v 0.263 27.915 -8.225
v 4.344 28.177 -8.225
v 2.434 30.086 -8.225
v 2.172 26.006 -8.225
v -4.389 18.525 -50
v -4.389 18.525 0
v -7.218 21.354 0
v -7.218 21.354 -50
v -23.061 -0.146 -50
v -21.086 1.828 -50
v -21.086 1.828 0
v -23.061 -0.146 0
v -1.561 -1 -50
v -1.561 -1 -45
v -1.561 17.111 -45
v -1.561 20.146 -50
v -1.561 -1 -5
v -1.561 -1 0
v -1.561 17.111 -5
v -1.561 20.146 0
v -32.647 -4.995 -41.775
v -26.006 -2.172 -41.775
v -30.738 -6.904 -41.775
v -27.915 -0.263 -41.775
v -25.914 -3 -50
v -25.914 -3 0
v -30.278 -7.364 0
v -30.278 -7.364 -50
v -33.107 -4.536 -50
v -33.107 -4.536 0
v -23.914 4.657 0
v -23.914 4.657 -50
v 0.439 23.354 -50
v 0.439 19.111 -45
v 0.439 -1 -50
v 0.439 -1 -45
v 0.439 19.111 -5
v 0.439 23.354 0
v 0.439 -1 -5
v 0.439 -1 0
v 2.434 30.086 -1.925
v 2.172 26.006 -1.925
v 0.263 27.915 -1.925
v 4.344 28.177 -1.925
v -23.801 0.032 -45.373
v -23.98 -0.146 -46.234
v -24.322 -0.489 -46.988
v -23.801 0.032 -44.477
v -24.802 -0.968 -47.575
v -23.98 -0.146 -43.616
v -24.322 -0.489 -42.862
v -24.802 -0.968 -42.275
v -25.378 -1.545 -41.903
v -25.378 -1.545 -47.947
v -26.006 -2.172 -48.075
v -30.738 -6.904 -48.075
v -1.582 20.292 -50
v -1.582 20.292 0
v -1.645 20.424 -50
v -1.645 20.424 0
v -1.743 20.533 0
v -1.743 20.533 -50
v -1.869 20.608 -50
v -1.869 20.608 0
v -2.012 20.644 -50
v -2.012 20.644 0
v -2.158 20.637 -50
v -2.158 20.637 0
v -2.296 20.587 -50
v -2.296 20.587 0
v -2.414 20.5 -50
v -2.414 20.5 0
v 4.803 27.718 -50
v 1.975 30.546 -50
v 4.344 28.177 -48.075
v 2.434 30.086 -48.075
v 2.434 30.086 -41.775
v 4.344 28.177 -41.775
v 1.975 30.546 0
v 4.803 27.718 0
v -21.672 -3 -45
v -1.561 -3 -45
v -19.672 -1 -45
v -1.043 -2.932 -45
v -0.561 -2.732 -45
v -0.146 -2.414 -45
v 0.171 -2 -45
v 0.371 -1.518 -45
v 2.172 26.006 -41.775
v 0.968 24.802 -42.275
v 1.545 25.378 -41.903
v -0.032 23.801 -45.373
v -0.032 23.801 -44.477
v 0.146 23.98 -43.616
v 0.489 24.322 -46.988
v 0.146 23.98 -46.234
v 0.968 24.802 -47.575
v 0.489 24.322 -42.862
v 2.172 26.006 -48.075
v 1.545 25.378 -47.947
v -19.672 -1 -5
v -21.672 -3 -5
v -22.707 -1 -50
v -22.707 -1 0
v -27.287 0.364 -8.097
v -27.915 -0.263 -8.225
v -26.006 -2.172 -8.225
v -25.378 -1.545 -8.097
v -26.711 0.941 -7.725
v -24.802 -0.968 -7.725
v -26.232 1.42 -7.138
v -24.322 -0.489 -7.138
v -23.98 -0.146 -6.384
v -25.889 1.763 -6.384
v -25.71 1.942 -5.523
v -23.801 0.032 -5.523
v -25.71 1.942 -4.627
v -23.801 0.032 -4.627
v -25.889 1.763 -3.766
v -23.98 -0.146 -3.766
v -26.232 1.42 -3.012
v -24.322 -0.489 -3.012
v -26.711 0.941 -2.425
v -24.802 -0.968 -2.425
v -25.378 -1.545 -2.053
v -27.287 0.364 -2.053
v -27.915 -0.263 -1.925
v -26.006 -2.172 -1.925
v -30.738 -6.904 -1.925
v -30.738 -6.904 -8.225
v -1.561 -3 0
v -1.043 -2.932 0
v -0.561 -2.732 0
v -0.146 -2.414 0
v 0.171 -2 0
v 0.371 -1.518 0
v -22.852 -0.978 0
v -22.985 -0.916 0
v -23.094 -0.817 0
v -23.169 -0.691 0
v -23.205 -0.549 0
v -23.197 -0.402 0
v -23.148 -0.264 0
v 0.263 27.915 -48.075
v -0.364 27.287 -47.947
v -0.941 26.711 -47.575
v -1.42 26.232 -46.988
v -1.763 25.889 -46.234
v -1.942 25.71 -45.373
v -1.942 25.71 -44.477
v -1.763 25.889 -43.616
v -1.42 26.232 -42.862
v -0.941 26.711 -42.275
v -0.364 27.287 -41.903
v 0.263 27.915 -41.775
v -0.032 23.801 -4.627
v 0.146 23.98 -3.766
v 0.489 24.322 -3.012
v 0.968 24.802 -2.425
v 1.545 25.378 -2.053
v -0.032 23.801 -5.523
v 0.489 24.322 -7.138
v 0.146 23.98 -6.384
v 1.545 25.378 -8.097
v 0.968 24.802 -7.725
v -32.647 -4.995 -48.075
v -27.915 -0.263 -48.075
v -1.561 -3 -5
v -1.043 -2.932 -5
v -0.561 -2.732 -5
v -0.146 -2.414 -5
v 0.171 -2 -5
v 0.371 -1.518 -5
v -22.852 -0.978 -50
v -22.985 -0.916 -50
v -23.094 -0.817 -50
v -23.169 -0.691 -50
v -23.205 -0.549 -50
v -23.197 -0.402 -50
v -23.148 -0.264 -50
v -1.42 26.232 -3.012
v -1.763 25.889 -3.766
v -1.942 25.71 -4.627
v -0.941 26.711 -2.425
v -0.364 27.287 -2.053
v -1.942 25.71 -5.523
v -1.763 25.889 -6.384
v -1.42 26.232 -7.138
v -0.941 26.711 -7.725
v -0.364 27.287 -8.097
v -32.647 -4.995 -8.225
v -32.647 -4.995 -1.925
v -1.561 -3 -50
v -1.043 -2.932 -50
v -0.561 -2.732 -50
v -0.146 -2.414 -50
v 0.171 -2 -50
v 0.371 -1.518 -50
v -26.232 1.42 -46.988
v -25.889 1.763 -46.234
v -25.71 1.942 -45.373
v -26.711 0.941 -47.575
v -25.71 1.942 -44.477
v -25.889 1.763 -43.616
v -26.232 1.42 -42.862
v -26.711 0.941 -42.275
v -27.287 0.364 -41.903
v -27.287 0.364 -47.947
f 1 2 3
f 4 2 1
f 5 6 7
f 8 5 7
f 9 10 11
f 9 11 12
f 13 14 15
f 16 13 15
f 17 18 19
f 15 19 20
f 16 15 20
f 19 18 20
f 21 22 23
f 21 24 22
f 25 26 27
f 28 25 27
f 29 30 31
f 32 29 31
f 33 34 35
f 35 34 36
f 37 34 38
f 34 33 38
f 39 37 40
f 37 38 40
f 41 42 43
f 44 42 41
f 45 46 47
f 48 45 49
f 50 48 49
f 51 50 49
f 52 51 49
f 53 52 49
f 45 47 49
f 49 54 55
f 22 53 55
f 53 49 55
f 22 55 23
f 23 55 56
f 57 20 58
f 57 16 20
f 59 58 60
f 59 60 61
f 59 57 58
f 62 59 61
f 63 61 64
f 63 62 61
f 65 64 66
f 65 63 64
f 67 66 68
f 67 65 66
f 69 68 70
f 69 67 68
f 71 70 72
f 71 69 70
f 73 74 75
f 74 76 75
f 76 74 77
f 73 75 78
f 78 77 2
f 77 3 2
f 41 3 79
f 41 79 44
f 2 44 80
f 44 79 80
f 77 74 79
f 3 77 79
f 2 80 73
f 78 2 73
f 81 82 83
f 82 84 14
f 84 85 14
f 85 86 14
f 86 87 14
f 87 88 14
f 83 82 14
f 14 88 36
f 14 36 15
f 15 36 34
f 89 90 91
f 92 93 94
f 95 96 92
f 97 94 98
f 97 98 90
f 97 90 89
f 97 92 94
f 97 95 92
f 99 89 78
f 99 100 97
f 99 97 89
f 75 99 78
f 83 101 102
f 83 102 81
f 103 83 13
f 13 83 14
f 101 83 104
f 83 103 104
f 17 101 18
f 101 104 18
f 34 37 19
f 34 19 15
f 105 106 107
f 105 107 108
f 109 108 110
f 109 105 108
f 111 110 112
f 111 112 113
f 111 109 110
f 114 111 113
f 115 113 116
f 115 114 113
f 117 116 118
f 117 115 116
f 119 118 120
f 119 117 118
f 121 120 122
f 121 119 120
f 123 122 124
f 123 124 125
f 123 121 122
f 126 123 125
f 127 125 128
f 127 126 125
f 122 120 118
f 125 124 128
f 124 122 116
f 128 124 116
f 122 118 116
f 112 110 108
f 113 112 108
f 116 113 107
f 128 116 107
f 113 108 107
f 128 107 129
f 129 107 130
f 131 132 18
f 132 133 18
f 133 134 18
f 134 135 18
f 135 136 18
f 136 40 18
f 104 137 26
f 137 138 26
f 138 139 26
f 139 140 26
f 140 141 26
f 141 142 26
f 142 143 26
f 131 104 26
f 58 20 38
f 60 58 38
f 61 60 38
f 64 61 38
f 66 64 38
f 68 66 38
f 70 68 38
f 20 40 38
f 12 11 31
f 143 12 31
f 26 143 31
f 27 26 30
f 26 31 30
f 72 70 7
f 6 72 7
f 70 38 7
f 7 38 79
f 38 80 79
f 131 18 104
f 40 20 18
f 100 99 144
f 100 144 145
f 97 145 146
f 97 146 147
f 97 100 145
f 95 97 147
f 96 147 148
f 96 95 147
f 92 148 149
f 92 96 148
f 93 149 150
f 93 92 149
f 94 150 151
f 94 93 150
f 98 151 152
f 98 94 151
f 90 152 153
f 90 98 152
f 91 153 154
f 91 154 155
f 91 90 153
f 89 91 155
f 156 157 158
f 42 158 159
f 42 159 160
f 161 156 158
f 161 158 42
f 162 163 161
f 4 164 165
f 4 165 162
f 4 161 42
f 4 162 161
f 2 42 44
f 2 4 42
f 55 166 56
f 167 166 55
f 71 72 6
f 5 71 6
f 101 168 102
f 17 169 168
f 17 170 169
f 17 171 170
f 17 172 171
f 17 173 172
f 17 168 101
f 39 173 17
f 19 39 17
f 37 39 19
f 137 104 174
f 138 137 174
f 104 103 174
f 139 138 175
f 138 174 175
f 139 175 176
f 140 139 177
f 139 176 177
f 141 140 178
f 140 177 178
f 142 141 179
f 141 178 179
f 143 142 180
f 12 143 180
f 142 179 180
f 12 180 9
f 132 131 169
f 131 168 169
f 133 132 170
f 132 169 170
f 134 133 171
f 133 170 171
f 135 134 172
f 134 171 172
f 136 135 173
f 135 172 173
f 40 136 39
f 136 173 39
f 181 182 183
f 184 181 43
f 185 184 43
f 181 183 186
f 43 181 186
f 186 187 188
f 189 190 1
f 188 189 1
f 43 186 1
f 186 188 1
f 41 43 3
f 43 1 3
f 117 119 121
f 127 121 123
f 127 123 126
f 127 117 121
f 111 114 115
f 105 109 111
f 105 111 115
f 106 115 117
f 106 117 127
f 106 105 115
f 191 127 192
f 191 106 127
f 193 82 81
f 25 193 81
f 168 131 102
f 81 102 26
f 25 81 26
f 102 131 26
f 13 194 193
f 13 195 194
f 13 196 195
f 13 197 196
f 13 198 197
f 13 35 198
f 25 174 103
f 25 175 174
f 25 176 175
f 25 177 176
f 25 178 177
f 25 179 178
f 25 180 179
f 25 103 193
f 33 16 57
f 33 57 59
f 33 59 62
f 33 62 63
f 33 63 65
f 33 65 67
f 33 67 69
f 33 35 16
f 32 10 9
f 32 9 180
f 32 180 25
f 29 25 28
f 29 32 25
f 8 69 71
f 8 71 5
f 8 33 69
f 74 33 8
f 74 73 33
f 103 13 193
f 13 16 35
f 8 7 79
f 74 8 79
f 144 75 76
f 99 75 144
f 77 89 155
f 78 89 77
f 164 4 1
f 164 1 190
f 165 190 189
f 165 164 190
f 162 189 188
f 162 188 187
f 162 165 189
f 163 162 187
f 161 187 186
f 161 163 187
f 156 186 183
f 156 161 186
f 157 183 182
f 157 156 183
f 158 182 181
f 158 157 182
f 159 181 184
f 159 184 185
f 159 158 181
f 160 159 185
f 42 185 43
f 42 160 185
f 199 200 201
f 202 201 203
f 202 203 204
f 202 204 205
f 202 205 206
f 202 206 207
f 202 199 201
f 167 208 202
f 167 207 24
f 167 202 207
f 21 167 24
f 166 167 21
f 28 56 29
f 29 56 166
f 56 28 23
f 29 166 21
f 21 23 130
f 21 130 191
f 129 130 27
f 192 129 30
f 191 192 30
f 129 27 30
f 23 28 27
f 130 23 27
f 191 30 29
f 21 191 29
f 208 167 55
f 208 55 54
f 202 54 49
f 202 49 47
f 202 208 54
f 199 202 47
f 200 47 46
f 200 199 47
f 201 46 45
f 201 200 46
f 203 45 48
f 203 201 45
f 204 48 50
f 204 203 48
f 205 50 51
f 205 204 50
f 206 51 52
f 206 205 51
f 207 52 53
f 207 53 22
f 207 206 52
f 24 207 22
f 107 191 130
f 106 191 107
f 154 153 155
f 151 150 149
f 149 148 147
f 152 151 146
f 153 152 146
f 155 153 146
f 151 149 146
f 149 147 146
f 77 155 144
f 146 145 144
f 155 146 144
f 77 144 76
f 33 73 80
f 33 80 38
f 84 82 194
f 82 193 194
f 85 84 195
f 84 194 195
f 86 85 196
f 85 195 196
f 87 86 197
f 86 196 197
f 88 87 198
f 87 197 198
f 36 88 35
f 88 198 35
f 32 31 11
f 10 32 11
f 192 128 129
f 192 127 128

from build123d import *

# Parameters (mm, degrees)
BOSS_EXTRUDE1_DEPTH     = 50
CUT_EXTRUDE1_DEPTH      = 1.35
CUT_EXTRUDE1_DEPTH_BACK = 1.35
SKETCH3_W               = 40
SKETCH3_H               = 20
CUT_EXTRUDE2_DEPTH      = 52.612698372
FILLET1_R               = 0.5
FILLET2_R               = 2


with BuildPart() as part:
    # Sketch1 → Boss-Extrude1 (new body)
    with BuildSketch(Plane.XY):
        Polygon((-23.914213562, -1), (-1.560660172, -1), (-1.560660172, 21.353553391), (-4.389087297, 18.525126266), (-7.217514421, 21.353553391), (1.974873734, 30.545941546), (4.803300859, 27.717514421), (0.439339828, 23.353553391), (0.439339828, -3), (-25.914213562, -3), (-30.278174593, -7.363961031), (-33.106601718, -4.535533906), (-23.914213562, 4.656854249), (-21.085786438, 1.828427125), align=None)
    extrude(amount=-BOSS_EXTRUDE1_DEPTH)

    # Sketch2 → Cut-Extrude1 (cut, two sides)
    with BuildSketch(Plane(origin=(-12.871320344, 12.871320344, 0), x_dir=(0.707106781, 0.707106781, 0), z_dir=(-0.707106781, 0.707106781, 0))) as cut_extrude1_sk:
        with BuildLine():
            Line((19.925, 1.925), (22.995689014, 1.925))
            Line((22.995689014, 1.925), (22.995689014, 8.225))
            Line((22.995689014, 8.225), (19.925, 8.225))
            ThreePointArc((19.925, 8.225), (16.775, 5.075), (19.925, 1.925))
        make_face()
        with BuildLine():
            Line((19.925, 41.775), (22.995689014, 41.775))
            Line((22.995689014, 41.775), (22.995689014, 48.075))
            Line((22.995689014, 48.075), (19.925, 48.075))
            ThreePointArc((19.925, 48.075), (16.775, 44.925), (19.925, 41.775))
        make_face()
        with BuildLine():
            Line((-19.925, 1.925), (-26.617009358, 1.925))
            Line((-26.617009358, 1.925), (-26.617009358, 8.225))
            Line((-26.617009358, 8.225), (-19.925, 8.225))
            ThreePointArc((-19.925, 8.225), (-16.775, 5.075), (-19.925, 1.925))
        make_face()
        with BuildLine():
            Line((-19.925, 41.775), (-26.617009358, 41.775))
            Line((-26.617009358, 41.775), (-26.617009358, 48.075))
            Line((-26.617009358, 48.075), (-19.925, 48.075))
            ThreePointArc((-19.925, 48.075), (-16.775, 44.925), (-19.925, 41.775))
        make_face()
    extrude(amount=CUT_EXTRUDE1_DEPTH, mode=Mode.SUBTRACT)
    extrude(cut_extrude1_sk.sketch, amount=-CUT_EXTRUDE1_DEPTH_BACK, mode=Mode.SUBTRACT)

    # Sketch3 → Cut-Extrude2 (cut, through all)
    with BuildSketch(Plane(origin=(16.26040764, 16.26040764, 0), x_dir=(0, 0, -1), z_dir=(0.707106781, 0.707106781, 0))):
        with Locations((25, 3.202795796)):
            Rectangle(SKETCH3_W, SKETCH3_H)
    extrude(amount=-CUT_EXTRUDE2_DEPTH, mode=Mode.SUBTRACT)

    # Fillet1
    fillet1_edges = [part.edges().sort_by_distance(p)[0] for p in [
        (-1.560660172, 21.353553391, -25),
        (-23.914213562, -1, -25),
    ]]
    fillet(fillet1_edges, radius=FILLET1_R)

    # Fillet2
    fillet2_edges = [part.edges().sort_by_distance(p)[0] for p in [
        (0.439339828, -3, -47.5),
        (0.439339828, -3, -2.5),
    ]]
    fillet(fillet2_edges, radius=FILLET2_R)


solid = part.part
